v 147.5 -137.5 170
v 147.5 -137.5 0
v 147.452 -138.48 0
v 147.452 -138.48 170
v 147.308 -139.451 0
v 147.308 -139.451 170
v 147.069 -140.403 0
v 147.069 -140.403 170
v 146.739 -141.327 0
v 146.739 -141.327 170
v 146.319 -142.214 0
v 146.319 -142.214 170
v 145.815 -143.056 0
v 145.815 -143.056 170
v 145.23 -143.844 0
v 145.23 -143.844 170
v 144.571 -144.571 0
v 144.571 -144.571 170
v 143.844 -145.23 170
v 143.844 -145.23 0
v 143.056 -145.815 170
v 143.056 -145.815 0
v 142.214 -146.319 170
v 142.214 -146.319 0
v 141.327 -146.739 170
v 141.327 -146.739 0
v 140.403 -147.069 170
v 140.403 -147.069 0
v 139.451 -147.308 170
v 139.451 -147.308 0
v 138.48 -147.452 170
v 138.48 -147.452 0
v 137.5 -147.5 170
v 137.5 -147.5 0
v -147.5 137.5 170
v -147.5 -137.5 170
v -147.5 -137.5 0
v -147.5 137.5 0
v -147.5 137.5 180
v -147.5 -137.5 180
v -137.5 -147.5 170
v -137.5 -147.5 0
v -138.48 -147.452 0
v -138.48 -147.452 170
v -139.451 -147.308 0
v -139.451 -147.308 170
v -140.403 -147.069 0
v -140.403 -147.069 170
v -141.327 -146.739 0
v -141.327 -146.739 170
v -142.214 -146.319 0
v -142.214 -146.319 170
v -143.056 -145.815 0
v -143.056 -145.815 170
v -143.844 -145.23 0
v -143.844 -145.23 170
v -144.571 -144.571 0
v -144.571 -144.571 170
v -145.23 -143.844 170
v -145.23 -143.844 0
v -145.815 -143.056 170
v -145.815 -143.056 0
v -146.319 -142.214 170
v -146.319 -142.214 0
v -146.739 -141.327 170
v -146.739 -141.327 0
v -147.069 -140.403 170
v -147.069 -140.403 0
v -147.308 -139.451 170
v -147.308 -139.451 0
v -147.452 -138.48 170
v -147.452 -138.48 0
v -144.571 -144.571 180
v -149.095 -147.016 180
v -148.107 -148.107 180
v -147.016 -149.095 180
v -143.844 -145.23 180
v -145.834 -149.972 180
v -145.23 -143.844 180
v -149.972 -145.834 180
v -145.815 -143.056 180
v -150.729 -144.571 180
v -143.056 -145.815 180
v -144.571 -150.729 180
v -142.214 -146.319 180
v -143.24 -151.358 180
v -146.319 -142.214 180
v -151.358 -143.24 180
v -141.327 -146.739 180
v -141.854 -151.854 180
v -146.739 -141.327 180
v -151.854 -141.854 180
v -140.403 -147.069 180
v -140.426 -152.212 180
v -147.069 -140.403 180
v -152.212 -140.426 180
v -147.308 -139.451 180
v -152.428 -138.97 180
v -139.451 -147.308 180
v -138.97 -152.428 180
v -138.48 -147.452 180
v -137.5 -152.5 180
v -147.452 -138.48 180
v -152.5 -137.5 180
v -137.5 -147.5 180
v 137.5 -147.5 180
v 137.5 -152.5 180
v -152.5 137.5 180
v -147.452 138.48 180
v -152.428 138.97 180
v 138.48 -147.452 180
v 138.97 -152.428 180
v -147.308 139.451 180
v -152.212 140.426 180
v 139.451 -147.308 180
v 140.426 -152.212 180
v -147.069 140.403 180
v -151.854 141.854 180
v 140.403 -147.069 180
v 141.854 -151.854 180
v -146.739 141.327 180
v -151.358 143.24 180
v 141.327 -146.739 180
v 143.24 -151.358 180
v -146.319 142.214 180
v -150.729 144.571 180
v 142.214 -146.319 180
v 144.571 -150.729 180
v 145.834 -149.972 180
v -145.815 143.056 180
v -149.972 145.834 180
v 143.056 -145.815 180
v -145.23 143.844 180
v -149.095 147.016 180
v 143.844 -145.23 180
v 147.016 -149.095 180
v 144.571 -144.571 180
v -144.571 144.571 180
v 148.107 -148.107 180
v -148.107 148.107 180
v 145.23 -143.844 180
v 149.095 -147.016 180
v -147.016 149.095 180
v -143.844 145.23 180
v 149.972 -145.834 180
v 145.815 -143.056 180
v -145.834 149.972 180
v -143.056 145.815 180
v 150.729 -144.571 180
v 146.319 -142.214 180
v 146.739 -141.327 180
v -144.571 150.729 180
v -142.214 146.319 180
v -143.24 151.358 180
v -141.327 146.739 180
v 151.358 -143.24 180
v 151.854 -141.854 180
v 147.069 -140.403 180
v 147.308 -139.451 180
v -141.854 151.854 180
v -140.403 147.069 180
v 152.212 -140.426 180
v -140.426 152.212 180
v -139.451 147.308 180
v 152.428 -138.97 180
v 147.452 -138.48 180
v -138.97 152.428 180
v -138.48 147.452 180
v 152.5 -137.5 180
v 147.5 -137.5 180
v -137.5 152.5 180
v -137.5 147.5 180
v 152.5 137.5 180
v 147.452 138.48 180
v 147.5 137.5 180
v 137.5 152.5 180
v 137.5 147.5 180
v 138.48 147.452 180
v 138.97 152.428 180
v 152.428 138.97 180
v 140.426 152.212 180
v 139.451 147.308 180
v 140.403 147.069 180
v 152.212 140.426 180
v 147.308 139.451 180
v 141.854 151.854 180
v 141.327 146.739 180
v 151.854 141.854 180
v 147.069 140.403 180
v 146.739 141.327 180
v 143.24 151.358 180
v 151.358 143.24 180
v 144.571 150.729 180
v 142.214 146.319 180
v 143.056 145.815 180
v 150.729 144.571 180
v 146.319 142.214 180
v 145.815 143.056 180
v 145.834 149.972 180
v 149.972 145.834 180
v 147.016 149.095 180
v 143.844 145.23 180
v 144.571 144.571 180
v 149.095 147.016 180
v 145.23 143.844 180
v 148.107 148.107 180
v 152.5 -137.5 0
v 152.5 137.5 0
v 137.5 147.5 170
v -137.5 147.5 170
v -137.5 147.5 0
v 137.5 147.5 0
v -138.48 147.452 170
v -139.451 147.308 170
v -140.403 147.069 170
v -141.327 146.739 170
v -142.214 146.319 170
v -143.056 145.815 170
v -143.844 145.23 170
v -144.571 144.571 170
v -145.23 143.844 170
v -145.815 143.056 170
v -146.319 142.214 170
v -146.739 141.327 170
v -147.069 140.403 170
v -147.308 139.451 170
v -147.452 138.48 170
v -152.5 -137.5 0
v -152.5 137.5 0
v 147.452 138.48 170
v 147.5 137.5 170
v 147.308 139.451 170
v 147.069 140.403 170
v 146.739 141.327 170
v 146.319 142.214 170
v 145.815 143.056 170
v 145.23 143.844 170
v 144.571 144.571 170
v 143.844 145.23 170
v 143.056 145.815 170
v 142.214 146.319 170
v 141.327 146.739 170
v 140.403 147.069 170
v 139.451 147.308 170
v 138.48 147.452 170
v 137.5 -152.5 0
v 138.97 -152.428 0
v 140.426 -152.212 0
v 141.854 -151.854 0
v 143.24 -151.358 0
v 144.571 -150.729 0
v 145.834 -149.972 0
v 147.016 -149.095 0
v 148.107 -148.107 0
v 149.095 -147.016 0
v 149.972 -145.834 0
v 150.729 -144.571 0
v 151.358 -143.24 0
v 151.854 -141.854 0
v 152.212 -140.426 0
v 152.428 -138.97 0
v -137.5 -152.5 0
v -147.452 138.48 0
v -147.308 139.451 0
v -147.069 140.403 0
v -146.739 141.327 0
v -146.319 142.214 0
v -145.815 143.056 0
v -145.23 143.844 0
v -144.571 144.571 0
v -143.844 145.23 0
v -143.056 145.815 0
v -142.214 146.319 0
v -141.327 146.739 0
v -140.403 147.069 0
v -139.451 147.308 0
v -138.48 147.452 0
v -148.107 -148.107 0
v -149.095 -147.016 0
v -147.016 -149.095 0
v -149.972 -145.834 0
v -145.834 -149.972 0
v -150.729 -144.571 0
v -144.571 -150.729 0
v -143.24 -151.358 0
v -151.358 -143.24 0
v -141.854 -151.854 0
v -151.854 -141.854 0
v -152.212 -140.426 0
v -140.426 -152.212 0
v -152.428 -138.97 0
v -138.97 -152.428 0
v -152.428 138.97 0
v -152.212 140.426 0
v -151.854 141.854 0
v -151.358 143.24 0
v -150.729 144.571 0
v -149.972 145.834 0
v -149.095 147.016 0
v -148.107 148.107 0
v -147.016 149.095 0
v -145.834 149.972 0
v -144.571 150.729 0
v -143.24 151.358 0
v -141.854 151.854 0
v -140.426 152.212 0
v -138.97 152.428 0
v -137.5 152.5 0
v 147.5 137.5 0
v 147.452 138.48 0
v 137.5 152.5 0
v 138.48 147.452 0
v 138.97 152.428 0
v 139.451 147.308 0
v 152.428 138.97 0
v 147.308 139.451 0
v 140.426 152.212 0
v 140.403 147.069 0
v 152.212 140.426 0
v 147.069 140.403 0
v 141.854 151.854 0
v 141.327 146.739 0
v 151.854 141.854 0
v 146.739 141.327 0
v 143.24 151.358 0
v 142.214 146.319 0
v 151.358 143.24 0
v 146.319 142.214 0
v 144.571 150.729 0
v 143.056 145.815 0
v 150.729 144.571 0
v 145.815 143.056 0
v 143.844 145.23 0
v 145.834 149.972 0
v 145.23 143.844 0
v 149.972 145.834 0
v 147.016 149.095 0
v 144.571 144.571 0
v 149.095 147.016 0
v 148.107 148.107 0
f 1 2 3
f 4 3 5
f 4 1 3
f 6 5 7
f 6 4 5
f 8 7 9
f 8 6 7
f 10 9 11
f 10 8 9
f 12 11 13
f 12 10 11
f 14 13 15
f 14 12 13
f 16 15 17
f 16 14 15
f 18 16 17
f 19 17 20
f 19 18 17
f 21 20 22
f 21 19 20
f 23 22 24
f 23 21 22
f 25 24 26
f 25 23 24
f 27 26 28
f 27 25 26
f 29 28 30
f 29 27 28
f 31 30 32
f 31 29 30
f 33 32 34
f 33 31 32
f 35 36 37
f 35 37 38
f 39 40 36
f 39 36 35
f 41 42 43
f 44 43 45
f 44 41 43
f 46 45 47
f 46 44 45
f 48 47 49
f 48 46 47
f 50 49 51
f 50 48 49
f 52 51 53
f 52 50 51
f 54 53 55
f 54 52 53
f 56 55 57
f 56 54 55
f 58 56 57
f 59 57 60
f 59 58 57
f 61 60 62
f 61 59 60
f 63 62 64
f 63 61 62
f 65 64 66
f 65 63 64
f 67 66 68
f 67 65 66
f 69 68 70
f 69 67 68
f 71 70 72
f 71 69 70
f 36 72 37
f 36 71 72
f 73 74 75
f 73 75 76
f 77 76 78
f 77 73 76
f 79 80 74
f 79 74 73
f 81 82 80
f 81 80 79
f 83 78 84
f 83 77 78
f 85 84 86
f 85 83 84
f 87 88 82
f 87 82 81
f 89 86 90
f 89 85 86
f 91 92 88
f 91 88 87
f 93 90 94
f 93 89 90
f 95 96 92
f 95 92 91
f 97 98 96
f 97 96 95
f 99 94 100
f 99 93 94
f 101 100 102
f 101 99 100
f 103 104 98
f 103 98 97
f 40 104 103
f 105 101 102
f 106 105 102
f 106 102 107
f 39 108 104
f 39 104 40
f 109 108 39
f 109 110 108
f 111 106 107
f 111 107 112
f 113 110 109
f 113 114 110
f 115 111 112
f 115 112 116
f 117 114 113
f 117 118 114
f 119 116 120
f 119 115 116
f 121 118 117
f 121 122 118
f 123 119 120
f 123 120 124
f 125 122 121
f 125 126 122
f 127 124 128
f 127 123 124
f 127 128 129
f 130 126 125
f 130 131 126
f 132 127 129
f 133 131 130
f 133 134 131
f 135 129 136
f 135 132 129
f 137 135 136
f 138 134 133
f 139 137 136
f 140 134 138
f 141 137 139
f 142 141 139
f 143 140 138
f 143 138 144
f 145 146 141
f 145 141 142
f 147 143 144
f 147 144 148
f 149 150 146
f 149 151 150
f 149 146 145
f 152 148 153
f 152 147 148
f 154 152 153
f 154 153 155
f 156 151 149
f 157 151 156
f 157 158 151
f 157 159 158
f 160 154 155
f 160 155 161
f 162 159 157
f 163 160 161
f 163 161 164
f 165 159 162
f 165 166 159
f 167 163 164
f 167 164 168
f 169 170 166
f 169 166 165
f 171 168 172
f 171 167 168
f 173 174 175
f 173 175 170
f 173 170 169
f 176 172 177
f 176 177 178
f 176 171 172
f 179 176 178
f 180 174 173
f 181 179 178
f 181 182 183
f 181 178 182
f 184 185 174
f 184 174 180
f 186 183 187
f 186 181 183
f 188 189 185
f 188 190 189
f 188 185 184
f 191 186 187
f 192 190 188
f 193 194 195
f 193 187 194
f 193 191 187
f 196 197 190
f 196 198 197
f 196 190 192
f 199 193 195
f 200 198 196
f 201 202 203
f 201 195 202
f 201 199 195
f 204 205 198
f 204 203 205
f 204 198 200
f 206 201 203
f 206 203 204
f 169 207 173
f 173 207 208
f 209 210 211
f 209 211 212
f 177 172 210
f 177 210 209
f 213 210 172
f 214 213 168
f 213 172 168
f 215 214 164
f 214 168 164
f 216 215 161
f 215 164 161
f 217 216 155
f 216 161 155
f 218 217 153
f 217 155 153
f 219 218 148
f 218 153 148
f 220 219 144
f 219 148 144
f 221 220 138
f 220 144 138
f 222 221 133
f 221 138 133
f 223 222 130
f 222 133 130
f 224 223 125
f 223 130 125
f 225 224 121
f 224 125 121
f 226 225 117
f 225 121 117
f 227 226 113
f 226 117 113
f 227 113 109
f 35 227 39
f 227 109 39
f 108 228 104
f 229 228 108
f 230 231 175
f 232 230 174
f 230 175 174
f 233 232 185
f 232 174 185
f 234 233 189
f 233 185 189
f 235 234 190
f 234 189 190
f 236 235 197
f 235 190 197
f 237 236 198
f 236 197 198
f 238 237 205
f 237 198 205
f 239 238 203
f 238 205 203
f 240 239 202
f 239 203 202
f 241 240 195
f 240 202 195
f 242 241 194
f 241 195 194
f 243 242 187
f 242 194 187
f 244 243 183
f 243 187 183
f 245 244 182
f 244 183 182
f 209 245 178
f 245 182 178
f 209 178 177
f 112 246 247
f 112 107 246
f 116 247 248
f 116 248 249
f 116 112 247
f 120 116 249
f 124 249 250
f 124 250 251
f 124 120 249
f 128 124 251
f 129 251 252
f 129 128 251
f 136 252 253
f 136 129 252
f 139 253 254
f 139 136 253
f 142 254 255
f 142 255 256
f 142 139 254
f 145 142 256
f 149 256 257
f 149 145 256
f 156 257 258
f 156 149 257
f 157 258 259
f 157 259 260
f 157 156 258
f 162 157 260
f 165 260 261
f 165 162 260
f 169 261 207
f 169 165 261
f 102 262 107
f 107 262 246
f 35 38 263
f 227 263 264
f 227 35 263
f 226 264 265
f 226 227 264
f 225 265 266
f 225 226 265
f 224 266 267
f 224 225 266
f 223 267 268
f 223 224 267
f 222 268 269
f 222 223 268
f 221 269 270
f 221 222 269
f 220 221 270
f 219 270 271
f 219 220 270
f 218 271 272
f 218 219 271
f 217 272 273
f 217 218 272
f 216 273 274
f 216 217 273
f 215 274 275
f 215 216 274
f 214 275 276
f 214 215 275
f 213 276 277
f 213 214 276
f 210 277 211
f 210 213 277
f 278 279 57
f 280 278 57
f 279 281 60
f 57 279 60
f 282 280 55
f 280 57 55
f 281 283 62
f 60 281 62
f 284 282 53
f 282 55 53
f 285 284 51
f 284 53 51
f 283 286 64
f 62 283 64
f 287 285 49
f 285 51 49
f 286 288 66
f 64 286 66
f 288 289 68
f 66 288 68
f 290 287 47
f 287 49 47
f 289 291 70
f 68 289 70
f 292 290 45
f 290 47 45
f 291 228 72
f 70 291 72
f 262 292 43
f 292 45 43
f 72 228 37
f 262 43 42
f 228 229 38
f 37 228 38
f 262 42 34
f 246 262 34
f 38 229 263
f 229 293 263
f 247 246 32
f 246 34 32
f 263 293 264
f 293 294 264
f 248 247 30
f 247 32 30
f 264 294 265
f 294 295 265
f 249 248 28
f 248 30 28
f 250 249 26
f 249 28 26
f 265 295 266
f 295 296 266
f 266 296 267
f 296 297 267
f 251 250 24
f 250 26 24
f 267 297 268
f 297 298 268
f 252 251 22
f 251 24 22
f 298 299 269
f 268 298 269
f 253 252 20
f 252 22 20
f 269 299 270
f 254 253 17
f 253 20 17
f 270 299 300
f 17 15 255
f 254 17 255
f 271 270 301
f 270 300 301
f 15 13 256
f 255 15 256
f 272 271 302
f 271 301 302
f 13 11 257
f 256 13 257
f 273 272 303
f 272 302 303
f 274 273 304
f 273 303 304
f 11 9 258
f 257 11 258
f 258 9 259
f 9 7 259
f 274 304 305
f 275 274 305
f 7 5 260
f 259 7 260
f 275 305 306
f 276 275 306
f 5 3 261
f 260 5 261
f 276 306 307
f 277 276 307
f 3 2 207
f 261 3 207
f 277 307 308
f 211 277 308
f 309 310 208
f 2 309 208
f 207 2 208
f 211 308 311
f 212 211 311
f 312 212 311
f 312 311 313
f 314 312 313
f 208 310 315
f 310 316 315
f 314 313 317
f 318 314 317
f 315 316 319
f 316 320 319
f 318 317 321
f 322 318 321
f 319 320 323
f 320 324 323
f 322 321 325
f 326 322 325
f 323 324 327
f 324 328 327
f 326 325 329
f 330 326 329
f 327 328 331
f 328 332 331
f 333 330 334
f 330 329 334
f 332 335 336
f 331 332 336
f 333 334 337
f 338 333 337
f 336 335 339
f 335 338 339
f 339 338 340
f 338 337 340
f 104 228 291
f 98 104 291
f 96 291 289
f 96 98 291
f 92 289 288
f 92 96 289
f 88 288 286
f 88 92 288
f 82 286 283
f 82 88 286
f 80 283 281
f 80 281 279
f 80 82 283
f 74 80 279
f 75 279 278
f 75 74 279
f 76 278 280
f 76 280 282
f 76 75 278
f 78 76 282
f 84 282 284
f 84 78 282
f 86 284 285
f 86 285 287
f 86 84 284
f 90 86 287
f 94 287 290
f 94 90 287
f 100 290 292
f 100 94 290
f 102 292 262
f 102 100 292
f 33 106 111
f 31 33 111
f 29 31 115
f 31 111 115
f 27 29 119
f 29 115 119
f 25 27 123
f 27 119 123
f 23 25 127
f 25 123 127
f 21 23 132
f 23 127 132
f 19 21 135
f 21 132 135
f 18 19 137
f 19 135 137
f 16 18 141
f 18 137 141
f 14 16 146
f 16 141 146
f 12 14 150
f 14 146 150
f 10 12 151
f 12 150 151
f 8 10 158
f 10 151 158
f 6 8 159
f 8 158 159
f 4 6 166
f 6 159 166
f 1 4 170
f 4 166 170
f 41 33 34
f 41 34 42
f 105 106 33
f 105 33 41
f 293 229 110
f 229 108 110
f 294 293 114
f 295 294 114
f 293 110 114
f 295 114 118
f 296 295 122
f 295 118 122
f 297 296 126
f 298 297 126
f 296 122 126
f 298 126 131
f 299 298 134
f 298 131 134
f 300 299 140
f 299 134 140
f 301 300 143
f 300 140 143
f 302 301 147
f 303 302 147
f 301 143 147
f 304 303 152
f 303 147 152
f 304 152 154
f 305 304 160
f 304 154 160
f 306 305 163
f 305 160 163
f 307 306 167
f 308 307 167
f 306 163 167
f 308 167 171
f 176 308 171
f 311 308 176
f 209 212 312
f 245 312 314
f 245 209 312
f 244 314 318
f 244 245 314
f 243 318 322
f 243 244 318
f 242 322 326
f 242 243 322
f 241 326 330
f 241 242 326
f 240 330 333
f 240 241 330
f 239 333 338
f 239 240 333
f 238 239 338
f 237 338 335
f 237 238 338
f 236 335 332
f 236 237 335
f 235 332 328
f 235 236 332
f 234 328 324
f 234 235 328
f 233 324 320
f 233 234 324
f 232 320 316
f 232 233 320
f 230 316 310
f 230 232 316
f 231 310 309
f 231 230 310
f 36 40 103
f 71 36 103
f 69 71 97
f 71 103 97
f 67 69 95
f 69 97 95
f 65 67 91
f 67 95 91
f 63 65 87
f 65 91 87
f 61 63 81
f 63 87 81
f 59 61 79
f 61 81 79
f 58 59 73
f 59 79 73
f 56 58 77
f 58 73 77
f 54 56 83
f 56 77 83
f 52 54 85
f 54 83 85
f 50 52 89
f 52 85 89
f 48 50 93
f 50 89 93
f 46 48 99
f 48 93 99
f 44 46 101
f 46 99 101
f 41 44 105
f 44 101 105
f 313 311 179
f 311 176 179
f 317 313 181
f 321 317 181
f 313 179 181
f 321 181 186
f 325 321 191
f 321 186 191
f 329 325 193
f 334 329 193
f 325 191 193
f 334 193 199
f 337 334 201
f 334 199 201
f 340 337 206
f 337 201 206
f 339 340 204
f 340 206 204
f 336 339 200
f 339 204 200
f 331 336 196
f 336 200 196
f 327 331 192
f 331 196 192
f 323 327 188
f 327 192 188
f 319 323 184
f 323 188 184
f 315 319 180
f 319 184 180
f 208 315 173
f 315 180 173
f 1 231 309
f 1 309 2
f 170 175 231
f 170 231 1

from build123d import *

# Parameters (mm, degrees)
ESQUISSE1_W              = 305
ESQUISSE1_H              = 305
BOSS_EXTRU_1_DEPTH       = 180
ESQUISSE2_R              = 10
ENL_V_MAT_EXTRU_10_DEPTH = 10
CONG_2_R                 = 15
ENL_V_MAT_EXTRU_11_DEPTH = 180


with BuildPart() as part:
    # Esquisse1 → Boss.-Extru.1 (new body)
    with BuildSketch(Plane.XY):
        Rectangle(ESQUISSE1_W, ESQUISSE1_H)
    extrude(amount=BOSS_EXTRU_1_DEPTH)

    # Esquisse2 → Enlèv. mat.-Extru.10 (cut)
    with BuildSketch(Plane.XY.offset(180)):
        with Locations((137.5, 137.5)):
            Circle(ESQUISSE2_R)
        with Locations((137.5, -137.5)):
            Circle(ESQUISSE2_R)
        with Locations((-137.5, -137.5)):
            Circle(ESQUISSE2_R)
        with Locations((-137.5, 137.5)):
            Circle(ESQUISSE2_R)
    extrude(amount=-ENL_V_MAT_EXTRU_10_DEPTH, mode=Mode.SUBTRACT)

    # Congé2
    cong_2_edges = [part.edges().sort_by_distance(p)[0] for p in [
        (-152.5, 152.5, 90),
        (152.5, 152.5, 90),
        (152.5, -152.5, 90),
        (-152.5, -152.5, 90),
    ]]
    fillet(cong_2_edges, radius=CONG_2_R)

    # Esquisse3 → Enlèv. mat.-Extru.11 (cut)
    with BuildSketch(Plane.XY.offset(180)):
        with BuildLine():
            Line((-137.5, 147.5), (137.5, 147.5))
            ThreePointArc((137.5, 147.5), (144.571068, 144.571068), (147.5, 137.5))
            Line((147.5, 137.5), (147.5, -137.5))
            ThreePointArc((147.5, -137.5), (144.571068, -144.571068), (137.5, -147.5))
            Line((137.5, -147.5), (-137.5, -147.5))
            ThreePointArc((-137.5, -147.5), (-144.571068, -144.571068), (-147.5, -137.5))
            Line((-147.5, -137.5), (-147.5, 137.5))
            ThreePointArc((-147.5, 137.5), (-144.571068, 144.571068), (-137.5, 147.5))
        make_face()
    extrude(amount=-ENL_V_MAT_EXTRU_11_DEPTH, mode=Mode.SUBTRACT)


solid = part.part
